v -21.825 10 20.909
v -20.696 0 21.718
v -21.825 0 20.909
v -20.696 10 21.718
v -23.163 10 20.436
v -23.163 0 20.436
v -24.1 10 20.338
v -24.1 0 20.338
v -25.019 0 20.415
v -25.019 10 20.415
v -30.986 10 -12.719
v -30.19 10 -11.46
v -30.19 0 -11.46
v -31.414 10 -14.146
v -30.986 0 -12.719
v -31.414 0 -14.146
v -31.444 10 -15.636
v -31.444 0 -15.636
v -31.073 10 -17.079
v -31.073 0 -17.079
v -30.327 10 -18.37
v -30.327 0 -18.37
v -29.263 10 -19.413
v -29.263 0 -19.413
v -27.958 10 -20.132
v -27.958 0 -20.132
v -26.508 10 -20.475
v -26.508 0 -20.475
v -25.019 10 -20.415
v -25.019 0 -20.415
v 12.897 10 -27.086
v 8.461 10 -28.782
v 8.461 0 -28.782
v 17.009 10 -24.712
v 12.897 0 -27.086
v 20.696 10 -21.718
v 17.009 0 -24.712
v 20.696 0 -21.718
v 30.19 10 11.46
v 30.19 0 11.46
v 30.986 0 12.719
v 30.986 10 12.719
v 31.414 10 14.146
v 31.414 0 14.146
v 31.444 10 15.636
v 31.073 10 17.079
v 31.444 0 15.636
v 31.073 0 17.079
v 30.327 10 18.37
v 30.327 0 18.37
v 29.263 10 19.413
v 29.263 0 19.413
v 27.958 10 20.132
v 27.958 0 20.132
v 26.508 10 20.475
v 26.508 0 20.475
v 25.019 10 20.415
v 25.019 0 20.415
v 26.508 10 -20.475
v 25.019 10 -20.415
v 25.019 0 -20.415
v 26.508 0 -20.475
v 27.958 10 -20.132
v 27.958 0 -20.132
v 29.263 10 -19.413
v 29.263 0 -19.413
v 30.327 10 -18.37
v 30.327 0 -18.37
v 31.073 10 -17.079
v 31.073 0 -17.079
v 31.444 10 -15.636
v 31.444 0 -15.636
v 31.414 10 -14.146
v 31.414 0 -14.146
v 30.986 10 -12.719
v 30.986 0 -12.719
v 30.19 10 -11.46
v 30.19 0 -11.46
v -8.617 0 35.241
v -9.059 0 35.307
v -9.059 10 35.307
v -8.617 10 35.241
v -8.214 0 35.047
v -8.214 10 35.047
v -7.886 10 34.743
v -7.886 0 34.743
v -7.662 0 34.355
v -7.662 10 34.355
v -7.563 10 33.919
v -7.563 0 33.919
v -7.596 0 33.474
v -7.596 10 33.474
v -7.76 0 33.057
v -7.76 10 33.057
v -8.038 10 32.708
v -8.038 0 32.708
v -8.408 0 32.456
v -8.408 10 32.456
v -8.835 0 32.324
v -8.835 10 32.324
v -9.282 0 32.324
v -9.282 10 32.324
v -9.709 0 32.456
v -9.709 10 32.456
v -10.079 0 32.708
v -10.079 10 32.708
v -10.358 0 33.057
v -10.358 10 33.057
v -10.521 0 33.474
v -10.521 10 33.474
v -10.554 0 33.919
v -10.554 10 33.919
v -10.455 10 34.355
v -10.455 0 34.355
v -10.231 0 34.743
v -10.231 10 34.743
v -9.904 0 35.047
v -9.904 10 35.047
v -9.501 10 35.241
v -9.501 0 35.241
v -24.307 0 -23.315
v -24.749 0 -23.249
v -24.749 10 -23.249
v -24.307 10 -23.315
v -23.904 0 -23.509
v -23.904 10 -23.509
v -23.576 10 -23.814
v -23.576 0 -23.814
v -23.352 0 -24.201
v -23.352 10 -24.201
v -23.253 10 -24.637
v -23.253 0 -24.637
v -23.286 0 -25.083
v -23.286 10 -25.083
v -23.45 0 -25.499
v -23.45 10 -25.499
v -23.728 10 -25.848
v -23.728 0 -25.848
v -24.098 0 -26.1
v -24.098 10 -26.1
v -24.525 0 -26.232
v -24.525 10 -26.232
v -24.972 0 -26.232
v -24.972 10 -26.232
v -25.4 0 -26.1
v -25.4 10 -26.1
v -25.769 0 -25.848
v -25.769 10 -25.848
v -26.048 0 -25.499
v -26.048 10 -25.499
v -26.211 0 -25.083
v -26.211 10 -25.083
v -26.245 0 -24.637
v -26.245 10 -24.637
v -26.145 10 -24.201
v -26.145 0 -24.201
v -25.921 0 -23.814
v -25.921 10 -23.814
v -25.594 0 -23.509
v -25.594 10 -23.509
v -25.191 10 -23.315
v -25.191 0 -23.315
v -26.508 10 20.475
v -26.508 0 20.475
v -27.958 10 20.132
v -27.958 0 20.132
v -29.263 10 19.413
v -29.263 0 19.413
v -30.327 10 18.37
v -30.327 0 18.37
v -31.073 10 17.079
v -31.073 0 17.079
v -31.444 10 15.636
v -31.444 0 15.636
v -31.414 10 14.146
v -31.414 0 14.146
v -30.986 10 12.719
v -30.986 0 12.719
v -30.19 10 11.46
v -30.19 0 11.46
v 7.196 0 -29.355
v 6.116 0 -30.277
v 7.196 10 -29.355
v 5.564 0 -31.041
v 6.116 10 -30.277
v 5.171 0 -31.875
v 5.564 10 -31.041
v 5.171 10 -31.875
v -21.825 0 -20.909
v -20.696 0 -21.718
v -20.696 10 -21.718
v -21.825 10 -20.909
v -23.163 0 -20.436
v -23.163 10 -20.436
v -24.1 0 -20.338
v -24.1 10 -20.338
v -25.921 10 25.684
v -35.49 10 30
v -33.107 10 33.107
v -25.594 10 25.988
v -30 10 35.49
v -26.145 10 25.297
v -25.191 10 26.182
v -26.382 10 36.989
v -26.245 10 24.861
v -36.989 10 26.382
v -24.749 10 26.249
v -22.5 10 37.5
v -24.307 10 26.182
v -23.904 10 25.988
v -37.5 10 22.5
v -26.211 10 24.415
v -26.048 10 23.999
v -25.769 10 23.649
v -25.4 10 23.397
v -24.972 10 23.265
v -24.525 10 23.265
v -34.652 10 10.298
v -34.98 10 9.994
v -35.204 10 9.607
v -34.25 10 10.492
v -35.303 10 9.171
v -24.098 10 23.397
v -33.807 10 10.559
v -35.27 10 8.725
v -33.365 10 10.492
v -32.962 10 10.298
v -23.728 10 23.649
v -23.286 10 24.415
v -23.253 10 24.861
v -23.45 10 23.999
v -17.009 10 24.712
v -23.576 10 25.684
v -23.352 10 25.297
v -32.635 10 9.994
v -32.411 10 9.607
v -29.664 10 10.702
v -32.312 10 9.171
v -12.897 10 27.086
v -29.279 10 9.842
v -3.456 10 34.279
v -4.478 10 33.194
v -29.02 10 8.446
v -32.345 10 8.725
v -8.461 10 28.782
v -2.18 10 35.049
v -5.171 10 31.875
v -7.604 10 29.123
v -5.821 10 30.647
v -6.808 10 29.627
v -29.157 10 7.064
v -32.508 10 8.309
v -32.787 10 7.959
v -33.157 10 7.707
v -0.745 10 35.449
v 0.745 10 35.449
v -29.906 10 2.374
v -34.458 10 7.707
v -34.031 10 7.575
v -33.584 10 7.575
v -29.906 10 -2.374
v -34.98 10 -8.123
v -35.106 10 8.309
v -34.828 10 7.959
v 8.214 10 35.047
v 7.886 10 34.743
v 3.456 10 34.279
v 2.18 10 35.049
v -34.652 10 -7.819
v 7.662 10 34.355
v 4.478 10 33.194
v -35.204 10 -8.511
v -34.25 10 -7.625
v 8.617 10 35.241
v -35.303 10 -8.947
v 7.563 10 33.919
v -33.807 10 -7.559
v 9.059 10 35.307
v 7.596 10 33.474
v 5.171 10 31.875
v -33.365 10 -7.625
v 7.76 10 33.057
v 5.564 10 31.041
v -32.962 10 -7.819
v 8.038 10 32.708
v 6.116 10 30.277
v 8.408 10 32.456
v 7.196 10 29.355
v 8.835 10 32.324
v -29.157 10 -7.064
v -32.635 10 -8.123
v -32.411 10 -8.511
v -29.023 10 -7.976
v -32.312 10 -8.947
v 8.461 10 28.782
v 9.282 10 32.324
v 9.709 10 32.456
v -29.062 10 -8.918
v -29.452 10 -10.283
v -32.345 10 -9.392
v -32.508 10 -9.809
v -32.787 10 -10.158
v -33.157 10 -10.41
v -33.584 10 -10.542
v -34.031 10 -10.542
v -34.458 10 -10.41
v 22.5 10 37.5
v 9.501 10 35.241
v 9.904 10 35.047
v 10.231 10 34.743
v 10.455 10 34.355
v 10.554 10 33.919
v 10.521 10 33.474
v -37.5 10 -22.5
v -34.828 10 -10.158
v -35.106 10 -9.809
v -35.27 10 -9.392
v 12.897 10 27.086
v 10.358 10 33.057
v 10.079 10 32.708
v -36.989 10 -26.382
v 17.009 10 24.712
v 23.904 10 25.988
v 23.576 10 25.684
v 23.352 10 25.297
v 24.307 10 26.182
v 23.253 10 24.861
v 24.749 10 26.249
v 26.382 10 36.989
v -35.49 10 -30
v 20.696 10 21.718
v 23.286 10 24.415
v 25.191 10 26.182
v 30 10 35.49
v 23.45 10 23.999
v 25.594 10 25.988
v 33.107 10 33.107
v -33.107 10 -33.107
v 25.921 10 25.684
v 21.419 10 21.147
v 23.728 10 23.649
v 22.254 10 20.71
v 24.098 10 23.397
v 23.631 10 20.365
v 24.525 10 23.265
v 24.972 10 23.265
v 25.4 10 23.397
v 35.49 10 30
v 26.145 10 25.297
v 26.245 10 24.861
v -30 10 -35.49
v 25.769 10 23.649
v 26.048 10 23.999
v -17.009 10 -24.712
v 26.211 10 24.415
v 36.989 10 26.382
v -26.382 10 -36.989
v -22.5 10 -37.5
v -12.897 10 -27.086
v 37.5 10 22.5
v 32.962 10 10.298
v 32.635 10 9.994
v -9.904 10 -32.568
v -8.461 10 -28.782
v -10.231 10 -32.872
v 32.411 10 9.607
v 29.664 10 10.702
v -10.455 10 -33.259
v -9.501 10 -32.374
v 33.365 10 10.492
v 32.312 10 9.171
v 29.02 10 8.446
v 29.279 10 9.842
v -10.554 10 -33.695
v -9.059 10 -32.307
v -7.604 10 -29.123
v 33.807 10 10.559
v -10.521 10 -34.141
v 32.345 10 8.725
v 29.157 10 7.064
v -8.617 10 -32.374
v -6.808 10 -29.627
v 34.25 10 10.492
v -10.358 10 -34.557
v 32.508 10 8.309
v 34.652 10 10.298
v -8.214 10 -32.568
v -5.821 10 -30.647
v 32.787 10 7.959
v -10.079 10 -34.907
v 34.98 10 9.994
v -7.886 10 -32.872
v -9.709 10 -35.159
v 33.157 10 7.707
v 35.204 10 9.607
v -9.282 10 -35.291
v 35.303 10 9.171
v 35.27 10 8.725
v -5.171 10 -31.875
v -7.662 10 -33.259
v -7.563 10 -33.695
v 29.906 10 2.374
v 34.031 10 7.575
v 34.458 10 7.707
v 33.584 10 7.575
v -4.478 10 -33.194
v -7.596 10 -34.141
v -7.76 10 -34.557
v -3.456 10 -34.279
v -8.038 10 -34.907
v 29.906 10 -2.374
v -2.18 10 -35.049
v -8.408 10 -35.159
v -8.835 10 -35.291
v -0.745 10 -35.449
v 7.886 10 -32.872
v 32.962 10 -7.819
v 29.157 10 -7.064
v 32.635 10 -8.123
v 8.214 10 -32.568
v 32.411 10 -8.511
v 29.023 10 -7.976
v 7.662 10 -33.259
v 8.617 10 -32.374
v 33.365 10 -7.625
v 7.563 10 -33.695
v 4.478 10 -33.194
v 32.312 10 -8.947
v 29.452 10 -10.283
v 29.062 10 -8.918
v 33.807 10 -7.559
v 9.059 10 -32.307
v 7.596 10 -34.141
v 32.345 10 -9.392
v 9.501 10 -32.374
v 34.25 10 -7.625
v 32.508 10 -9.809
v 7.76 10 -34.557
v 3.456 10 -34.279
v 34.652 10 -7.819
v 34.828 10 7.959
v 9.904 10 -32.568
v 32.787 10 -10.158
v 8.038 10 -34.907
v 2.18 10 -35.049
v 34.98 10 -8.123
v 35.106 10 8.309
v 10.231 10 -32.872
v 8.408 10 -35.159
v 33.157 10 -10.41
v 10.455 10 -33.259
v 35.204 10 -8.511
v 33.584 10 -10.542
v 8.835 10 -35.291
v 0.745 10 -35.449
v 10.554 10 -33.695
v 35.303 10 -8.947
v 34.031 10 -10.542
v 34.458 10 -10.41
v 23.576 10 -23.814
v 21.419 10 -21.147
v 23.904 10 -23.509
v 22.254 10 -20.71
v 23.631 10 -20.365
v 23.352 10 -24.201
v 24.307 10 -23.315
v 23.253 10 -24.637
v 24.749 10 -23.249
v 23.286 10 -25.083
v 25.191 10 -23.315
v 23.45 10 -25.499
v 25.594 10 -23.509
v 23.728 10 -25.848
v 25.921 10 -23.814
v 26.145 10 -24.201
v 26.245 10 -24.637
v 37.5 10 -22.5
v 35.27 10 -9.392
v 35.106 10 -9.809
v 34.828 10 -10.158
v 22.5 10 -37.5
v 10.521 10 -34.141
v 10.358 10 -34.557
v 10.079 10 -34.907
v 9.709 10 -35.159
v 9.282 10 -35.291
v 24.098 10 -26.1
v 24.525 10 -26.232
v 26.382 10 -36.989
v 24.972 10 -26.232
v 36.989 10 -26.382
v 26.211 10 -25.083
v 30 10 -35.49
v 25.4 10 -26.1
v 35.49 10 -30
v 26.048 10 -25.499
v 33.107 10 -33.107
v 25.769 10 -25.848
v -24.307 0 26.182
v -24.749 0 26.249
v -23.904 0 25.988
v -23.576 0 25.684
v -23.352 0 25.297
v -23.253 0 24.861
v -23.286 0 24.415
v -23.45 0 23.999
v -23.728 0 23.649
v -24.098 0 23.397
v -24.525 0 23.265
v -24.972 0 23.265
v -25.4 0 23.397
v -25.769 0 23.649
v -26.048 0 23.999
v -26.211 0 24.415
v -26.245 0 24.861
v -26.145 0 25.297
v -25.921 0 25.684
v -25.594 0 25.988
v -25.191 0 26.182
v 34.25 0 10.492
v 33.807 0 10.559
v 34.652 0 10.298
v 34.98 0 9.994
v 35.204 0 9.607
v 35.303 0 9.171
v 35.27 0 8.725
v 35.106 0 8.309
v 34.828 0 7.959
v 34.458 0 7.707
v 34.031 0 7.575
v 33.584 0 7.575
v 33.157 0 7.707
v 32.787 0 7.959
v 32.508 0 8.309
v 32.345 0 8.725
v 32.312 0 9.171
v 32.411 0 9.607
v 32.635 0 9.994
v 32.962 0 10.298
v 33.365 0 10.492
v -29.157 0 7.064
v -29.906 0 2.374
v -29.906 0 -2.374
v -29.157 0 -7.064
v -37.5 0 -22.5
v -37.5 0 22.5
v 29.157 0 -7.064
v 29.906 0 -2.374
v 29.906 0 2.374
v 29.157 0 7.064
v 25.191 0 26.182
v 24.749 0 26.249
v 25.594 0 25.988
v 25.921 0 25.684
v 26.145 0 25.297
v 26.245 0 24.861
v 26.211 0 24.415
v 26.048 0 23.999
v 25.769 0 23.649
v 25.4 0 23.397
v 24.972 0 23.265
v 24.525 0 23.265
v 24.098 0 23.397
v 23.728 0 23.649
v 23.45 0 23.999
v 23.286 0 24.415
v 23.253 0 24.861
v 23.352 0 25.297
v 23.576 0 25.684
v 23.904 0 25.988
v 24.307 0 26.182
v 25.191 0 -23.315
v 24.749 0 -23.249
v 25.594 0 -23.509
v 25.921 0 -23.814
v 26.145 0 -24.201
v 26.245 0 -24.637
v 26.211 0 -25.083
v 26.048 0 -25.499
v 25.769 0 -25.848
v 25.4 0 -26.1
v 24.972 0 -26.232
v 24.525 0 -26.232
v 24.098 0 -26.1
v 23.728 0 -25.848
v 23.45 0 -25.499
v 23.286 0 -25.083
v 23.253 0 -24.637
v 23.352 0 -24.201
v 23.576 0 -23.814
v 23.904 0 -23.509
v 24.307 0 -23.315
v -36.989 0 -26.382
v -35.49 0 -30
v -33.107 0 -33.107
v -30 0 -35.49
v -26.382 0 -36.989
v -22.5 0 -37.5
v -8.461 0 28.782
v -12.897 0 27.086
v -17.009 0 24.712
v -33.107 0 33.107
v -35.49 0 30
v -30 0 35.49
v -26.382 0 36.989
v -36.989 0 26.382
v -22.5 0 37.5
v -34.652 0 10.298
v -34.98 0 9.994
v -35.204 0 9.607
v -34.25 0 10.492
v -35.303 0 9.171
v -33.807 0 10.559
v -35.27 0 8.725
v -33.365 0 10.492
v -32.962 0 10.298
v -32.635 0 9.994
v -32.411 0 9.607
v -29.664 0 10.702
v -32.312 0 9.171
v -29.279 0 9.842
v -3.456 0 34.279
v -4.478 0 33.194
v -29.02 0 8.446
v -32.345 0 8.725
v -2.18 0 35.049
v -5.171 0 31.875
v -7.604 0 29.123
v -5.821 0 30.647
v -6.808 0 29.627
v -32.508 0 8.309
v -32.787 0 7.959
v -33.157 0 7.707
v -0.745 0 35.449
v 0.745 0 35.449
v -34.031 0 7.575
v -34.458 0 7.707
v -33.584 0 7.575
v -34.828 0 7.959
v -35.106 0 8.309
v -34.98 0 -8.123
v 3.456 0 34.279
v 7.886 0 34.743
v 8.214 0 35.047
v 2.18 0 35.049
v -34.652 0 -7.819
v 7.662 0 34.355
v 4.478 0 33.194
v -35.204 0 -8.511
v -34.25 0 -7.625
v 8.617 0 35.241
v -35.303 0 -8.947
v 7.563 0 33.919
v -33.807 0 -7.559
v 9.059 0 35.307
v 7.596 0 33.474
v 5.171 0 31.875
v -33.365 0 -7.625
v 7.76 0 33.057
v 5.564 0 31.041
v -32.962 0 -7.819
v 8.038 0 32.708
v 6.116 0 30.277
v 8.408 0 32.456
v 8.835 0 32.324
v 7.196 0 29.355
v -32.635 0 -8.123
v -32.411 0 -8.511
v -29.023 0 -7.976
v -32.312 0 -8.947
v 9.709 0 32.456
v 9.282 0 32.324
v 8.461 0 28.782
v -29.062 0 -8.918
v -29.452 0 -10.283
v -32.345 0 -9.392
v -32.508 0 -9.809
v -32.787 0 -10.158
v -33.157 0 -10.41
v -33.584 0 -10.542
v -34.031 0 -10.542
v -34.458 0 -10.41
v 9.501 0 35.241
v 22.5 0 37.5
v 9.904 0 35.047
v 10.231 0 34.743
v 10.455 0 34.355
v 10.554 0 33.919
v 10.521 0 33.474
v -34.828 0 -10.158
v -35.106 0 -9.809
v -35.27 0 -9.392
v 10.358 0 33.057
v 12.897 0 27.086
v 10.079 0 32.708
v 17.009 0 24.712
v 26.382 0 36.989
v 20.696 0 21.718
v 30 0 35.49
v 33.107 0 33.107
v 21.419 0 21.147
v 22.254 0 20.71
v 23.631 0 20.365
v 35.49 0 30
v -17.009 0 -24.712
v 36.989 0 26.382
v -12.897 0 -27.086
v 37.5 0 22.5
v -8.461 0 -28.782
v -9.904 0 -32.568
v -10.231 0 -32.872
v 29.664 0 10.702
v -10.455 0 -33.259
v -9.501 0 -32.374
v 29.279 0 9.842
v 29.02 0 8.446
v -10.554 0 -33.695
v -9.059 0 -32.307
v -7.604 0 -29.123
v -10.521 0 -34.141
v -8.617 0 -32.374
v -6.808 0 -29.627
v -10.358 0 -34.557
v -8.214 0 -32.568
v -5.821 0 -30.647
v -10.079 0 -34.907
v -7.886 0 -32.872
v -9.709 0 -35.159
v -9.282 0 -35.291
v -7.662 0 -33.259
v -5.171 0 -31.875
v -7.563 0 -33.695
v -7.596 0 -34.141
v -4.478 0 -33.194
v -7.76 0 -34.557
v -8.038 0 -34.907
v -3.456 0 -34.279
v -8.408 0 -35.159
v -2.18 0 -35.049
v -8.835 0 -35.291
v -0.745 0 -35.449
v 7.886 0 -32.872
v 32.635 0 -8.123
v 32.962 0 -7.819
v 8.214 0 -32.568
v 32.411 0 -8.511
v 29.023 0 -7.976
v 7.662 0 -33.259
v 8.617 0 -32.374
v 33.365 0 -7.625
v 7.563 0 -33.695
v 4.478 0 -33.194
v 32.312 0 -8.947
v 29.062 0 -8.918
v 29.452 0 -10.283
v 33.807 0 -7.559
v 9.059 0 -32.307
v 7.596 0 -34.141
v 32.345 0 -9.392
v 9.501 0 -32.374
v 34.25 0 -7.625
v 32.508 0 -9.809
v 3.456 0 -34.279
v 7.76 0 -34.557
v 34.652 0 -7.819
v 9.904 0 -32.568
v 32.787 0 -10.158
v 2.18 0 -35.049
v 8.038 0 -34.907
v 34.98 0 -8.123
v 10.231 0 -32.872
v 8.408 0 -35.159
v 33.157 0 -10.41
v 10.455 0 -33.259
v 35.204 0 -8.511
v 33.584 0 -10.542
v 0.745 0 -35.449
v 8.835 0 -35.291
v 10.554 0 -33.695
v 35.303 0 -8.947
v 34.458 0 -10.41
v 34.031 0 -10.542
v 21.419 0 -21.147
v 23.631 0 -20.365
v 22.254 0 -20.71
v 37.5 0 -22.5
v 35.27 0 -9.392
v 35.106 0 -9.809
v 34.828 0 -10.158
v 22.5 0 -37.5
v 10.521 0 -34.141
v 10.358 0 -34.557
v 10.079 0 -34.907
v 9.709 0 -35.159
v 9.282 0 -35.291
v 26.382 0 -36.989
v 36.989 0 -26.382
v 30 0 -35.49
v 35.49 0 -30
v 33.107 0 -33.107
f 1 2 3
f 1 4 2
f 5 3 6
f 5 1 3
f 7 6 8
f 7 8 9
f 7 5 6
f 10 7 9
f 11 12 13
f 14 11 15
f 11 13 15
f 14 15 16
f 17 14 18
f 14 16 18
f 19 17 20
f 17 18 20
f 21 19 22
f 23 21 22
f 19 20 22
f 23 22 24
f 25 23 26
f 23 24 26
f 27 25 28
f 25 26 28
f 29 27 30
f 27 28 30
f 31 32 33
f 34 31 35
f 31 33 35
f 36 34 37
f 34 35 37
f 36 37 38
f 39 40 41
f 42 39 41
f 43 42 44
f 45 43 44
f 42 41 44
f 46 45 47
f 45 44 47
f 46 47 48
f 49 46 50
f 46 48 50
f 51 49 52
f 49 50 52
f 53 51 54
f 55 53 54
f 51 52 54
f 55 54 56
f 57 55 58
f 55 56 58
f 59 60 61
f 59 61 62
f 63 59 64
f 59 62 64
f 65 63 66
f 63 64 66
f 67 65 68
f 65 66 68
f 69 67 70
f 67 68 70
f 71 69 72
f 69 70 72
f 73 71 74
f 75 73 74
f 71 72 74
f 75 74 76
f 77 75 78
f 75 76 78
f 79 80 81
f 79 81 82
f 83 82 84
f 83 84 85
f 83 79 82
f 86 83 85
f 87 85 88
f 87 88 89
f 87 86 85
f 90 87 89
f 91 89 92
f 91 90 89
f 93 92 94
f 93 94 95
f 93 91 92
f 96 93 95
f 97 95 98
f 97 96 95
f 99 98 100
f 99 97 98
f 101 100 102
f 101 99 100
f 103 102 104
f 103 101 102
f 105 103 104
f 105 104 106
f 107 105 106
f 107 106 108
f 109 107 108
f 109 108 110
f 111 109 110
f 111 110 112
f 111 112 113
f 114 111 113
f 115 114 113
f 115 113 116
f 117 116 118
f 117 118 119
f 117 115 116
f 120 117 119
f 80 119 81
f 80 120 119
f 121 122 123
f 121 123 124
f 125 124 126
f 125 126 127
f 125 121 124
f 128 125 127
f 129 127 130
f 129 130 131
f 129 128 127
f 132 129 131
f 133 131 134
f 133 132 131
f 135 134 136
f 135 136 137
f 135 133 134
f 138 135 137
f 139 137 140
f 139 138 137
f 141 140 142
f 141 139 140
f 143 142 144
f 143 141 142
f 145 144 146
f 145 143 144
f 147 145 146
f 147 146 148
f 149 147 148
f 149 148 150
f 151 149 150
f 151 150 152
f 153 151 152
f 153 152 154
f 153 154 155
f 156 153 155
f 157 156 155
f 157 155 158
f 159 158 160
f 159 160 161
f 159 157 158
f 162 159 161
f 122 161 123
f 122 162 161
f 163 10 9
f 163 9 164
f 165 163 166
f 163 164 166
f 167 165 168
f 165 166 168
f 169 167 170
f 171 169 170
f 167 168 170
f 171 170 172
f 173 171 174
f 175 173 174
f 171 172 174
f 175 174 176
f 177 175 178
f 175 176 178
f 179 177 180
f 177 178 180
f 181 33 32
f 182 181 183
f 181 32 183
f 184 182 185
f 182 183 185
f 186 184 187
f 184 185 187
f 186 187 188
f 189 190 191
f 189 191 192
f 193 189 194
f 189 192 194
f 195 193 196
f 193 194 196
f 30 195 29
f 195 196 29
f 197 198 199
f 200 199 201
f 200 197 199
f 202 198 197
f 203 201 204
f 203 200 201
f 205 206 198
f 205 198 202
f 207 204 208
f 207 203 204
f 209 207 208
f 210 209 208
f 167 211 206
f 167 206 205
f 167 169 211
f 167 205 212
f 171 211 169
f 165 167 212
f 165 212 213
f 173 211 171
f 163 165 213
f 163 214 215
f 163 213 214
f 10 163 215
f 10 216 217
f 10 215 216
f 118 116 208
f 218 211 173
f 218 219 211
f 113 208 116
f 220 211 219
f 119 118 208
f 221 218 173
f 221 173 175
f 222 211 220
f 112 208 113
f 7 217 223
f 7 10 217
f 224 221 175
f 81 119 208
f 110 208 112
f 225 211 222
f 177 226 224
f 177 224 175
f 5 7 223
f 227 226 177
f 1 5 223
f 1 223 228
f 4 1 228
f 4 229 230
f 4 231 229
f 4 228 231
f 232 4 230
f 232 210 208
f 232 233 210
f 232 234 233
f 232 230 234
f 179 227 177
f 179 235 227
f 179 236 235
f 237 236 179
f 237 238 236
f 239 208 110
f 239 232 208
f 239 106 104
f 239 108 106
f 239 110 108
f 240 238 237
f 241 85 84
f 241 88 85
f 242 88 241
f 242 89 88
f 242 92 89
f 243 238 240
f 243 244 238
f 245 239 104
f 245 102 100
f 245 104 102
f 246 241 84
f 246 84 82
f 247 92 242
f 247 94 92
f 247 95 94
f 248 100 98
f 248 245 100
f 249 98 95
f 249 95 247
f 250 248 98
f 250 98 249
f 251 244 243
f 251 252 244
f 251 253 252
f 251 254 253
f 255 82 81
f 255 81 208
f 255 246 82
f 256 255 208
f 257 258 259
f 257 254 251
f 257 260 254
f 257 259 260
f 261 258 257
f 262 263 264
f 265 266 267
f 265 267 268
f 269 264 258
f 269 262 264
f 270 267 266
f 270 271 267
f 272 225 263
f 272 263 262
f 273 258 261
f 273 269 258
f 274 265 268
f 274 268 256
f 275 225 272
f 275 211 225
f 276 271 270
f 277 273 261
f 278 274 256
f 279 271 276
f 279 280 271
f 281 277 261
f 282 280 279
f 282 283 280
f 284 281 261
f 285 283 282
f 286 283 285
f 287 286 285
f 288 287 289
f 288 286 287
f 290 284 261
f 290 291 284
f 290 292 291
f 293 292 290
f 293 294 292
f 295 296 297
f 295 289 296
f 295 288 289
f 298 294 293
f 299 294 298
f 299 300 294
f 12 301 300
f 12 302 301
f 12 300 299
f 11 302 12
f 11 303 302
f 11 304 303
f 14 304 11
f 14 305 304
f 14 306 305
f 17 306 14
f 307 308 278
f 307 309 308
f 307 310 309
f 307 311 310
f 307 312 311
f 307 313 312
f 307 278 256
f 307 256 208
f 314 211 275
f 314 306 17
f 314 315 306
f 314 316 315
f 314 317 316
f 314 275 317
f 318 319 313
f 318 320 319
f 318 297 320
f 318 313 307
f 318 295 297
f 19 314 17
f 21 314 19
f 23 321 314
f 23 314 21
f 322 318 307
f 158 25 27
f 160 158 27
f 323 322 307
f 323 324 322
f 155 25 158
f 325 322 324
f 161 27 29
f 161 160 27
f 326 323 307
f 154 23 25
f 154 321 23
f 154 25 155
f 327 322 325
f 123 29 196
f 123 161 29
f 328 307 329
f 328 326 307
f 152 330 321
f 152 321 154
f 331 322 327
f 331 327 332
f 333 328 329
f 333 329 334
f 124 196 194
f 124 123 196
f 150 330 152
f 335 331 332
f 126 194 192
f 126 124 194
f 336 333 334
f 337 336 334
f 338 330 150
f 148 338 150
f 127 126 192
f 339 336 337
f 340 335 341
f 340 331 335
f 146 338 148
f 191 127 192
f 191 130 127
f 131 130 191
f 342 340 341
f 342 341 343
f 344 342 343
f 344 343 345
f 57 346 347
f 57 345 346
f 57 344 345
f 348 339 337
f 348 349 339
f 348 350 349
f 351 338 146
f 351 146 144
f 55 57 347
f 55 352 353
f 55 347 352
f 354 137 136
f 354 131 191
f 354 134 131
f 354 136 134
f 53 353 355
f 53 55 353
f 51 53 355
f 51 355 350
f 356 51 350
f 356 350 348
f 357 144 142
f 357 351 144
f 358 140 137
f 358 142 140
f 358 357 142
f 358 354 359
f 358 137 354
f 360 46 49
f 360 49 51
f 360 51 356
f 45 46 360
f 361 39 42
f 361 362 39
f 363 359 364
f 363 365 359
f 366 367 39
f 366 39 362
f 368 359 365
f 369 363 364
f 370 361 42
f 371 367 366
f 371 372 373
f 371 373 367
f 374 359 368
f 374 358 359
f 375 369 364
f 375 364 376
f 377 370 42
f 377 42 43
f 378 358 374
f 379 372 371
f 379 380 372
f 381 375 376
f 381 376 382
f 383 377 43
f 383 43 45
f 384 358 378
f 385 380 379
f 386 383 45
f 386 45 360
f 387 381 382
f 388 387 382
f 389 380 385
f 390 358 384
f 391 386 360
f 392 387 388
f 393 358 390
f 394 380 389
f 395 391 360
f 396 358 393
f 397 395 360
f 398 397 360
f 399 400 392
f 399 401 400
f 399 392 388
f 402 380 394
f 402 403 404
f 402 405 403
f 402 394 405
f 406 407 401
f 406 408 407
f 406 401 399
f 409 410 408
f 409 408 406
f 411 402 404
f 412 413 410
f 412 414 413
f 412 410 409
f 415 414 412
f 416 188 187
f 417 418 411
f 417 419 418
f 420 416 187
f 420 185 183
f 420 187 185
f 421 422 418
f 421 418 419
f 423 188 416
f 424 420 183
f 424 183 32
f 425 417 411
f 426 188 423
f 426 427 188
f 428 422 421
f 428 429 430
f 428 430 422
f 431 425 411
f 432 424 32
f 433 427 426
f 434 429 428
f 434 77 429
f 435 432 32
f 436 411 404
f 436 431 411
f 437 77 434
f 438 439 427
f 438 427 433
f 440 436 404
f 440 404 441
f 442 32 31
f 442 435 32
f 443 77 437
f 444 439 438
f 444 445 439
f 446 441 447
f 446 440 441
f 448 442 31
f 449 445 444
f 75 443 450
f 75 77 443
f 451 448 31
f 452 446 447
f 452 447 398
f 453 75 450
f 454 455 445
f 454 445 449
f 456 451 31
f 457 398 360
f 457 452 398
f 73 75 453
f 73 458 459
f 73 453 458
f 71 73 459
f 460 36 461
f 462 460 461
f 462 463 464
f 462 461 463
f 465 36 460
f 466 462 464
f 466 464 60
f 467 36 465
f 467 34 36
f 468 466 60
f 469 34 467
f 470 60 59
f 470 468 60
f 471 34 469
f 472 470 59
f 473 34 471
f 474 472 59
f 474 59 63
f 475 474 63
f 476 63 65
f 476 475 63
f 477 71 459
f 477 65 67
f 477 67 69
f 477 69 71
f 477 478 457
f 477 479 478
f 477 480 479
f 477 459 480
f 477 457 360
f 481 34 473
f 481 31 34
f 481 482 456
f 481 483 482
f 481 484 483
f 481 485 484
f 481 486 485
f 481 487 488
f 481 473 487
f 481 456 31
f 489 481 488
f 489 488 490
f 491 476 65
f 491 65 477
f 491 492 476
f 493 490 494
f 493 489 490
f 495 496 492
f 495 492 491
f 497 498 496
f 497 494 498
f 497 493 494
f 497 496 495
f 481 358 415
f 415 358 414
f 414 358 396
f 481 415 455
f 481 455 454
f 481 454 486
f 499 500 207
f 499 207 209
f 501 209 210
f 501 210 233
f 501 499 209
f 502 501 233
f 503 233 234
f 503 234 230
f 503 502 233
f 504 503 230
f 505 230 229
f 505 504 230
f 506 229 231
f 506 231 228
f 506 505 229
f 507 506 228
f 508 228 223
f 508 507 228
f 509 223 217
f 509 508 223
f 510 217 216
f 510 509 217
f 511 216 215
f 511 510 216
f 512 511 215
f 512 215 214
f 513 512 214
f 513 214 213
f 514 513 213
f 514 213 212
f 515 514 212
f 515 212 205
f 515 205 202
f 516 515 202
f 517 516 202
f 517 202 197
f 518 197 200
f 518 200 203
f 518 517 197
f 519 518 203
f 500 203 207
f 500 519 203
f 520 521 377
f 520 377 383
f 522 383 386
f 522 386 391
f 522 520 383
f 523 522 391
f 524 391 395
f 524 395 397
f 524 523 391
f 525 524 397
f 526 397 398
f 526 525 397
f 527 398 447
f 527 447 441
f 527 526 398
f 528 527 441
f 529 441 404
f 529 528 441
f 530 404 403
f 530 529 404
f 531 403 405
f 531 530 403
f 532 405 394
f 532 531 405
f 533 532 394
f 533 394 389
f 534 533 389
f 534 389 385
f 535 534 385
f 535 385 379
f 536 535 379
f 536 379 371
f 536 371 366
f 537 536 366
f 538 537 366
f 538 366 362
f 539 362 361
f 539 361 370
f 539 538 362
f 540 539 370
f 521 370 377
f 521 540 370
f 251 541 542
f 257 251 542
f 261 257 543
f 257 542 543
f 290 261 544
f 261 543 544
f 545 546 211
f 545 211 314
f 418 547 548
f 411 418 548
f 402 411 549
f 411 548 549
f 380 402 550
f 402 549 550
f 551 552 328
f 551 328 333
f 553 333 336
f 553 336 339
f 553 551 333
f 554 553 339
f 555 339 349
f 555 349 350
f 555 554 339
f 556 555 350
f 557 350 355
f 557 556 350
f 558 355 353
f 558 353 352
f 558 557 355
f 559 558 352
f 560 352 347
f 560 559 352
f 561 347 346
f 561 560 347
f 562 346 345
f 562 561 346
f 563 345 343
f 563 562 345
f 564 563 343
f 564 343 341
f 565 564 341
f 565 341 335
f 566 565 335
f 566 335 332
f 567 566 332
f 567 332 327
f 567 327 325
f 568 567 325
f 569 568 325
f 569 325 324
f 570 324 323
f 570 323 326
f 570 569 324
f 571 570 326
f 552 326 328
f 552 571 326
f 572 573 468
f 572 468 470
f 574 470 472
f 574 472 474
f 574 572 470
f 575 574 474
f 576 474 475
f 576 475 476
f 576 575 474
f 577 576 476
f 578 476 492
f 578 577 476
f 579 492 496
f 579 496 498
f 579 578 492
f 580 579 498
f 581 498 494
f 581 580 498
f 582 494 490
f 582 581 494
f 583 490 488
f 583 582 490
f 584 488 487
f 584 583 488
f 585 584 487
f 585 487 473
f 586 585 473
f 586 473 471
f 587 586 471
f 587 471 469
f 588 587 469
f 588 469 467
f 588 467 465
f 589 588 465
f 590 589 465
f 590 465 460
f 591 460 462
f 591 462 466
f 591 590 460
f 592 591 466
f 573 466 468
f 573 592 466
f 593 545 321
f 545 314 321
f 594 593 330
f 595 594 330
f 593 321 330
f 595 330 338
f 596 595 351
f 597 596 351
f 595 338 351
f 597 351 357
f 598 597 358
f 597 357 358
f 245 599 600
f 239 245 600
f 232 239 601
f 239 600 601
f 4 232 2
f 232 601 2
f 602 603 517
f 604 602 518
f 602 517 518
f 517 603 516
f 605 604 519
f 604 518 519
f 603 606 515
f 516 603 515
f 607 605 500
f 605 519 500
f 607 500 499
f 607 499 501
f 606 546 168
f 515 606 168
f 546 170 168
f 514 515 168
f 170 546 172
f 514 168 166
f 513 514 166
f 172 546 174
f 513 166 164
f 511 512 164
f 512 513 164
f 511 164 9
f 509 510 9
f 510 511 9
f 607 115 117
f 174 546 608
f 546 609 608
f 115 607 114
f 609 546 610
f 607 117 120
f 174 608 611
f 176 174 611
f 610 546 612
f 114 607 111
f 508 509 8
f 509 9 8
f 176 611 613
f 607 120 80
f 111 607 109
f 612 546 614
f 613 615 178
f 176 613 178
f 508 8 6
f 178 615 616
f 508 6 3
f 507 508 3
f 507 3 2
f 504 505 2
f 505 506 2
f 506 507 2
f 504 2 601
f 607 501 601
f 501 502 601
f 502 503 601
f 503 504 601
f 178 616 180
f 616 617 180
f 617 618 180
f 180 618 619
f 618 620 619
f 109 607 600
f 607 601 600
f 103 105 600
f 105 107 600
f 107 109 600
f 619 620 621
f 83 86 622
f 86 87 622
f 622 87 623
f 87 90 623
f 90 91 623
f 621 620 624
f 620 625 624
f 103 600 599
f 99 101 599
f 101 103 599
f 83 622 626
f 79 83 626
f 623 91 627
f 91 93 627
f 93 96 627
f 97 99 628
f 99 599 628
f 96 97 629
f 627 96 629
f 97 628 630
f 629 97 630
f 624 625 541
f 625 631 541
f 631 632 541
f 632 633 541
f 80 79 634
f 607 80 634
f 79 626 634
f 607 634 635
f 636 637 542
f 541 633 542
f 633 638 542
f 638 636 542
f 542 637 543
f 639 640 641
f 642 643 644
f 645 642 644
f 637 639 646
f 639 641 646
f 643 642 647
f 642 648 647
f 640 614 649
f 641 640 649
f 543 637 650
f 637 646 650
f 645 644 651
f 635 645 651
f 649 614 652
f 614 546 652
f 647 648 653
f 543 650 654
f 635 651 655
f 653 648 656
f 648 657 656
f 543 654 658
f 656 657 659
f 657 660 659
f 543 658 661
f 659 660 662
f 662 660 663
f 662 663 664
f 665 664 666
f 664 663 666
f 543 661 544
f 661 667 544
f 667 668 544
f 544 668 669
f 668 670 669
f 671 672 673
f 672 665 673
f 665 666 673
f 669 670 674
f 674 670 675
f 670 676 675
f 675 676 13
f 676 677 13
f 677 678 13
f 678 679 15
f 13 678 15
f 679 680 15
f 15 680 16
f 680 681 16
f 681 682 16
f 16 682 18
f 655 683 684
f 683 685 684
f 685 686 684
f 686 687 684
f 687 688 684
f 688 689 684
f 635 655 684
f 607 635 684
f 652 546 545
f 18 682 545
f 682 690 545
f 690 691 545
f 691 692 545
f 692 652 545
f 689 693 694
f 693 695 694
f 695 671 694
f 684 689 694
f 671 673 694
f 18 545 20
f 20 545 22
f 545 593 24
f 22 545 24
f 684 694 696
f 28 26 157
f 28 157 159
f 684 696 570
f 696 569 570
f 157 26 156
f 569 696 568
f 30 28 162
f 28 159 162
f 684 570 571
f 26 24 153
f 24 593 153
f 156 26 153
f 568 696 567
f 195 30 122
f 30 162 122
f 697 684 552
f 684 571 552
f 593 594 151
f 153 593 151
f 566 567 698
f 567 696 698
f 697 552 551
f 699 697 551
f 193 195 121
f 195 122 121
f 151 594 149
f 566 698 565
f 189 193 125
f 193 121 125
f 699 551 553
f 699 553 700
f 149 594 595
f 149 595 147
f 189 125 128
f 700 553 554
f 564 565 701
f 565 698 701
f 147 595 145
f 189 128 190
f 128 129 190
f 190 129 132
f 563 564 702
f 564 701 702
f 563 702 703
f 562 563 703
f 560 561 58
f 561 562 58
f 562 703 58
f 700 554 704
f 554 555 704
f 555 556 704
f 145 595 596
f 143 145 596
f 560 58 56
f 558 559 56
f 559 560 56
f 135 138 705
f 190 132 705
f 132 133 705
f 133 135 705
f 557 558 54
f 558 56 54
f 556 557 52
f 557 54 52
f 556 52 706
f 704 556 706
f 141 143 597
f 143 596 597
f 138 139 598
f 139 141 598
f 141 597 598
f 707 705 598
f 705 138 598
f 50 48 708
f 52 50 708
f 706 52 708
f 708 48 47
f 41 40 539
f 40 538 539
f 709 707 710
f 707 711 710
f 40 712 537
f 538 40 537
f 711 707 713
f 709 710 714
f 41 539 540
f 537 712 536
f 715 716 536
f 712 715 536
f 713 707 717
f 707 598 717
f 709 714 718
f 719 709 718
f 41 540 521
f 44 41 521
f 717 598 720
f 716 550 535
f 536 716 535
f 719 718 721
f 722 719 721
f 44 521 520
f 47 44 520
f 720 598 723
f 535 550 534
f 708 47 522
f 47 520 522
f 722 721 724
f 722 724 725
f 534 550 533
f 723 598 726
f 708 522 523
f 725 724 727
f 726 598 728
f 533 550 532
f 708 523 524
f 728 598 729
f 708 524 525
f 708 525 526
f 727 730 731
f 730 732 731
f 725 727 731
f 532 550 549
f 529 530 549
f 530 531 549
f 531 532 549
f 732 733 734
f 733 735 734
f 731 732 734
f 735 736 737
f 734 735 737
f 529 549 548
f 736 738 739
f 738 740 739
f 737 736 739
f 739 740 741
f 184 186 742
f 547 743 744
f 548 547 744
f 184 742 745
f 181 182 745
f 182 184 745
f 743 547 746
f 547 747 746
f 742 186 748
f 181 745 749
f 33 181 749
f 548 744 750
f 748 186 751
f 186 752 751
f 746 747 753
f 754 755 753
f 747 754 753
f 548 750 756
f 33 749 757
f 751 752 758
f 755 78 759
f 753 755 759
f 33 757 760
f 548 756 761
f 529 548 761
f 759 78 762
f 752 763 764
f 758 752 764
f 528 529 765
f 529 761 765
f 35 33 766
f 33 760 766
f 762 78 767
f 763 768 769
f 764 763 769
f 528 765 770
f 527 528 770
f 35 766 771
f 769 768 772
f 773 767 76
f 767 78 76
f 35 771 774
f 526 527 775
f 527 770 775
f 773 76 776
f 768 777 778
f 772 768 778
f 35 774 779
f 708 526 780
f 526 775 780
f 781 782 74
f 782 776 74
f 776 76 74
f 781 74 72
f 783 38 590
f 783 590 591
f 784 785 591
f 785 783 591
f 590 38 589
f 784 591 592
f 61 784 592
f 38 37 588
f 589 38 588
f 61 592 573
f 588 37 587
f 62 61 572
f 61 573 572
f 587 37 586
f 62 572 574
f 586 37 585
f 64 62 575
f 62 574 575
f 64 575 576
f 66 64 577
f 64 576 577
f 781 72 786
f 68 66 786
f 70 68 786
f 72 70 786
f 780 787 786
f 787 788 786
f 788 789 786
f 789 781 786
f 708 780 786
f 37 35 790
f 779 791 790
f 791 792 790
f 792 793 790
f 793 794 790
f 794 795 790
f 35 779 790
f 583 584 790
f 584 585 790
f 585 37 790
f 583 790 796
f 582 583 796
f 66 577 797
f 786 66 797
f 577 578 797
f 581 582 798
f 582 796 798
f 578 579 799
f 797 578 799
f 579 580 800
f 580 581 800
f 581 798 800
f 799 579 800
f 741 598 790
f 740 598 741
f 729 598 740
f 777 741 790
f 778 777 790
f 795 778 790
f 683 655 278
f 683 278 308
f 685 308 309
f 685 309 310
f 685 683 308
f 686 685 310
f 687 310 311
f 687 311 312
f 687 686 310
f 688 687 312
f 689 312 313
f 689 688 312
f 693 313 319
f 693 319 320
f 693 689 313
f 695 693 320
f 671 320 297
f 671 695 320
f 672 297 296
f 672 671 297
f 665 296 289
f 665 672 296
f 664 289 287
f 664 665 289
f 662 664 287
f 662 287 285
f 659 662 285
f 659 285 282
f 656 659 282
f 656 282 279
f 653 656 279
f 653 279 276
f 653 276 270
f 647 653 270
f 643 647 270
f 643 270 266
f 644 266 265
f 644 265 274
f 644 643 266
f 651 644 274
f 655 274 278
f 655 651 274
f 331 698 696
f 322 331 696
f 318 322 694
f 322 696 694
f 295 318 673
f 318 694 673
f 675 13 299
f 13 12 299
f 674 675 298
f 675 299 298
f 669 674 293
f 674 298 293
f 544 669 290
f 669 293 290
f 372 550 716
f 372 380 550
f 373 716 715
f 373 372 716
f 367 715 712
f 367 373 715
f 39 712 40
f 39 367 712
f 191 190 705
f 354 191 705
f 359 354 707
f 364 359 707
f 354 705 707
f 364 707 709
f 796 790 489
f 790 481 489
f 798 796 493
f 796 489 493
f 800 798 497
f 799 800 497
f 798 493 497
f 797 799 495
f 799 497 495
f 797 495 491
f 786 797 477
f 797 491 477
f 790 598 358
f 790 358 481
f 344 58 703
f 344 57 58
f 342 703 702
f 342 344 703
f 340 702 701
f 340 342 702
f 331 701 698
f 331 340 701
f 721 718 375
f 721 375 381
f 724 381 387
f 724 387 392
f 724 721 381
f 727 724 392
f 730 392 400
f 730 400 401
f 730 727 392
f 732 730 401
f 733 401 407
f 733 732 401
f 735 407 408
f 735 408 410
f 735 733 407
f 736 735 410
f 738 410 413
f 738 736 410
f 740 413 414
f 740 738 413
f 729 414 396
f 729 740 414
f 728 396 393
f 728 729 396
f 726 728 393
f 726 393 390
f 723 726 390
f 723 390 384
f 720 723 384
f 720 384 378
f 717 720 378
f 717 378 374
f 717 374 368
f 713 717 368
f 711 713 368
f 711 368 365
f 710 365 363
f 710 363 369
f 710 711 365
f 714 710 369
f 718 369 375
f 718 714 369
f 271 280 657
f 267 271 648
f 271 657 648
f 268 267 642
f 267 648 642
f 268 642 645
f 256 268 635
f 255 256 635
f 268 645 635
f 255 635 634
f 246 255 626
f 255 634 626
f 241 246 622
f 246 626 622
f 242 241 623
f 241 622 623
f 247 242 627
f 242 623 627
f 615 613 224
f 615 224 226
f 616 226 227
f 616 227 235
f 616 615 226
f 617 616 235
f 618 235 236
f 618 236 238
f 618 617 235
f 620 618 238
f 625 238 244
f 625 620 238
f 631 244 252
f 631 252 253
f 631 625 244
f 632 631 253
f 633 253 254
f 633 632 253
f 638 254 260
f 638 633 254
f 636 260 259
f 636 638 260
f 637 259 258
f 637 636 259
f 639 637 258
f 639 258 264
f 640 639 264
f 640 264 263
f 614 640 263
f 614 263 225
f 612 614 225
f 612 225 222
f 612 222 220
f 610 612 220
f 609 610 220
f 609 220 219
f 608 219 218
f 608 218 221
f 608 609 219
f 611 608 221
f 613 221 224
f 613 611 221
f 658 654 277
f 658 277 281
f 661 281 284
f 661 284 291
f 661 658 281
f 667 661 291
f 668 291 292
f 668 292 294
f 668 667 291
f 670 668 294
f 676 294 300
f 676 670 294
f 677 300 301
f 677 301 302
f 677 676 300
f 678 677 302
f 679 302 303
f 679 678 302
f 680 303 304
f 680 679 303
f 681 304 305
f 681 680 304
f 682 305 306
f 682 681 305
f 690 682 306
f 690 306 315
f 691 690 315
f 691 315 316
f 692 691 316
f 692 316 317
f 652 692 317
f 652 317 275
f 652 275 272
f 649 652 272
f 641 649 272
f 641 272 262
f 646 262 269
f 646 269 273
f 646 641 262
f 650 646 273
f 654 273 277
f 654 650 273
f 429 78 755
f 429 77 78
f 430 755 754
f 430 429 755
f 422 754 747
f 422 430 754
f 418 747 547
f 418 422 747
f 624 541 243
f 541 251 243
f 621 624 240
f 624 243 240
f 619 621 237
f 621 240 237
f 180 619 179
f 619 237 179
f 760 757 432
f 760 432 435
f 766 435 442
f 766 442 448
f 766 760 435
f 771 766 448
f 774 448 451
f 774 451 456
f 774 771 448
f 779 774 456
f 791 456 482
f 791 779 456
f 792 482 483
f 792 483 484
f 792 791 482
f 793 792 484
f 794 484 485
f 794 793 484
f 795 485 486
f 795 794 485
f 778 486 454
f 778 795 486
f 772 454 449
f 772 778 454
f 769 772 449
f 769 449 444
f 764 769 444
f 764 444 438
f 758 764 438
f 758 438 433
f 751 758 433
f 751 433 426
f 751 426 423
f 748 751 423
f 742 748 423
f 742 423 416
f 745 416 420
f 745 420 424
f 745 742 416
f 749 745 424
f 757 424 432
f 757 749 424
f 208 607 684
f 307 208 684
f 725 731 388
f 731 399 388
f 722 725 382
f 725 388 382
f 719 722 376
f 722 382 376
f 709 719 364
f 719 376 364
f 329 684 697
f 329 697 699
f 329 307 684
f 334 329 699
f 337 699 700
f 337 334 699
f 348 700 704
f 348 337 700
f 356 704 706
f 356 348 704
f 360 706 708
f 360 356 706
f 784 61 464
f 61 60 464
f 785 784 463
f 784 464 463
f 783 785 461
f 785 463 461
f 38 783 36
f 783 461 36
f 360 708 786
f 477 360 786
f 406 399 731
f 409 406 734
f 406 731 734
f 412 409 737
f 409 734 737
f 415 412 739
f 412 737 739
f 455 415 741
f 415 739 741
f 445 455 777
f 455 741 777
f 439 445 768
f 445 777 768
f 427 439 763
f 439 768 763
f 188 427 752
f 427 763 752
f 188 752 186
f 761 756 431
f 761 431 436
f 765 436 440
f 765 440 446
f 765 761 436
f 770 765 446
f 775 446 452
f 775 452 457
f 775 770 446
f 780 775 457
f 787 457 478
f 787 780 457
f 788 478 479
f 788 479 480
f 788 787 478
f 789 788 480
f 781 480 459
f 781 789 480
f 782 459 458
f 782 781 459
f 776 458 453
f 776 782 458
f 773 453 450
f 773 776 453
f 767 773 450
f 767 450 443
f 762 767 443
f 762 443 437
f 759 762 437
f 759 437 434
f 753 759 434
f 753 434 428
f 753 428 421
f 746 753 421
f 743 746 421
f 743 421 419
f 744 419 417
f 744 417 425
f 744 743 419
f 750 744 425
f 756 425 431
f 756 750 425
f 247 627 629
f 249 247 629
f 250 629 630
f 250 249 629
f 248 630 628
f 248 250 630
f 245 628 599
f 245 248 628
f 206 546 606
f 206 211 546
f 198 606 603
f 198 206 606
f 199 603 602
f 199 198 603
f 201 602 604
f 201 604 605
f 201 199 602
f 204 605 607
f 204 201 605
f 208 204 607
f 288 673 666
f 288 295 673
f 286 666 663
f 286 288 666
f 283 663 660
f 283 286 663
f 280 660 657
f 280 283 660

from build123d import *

# Parameters (mm, degrees)
SKETCH1_W           = 75
SKETCH1_H           = 75
SKETCH1_R           = 1.5
BOSS_EXTRUDE1_DEPTH = 10
FILLET1_R           = 5
FILLET2_R           = 15


with BuildPart() as part:
    # Sketch1 → Boss-Extrude1 (new body)
    with BuildSketch(Plane(origin=(0, 0, 0), x_dir=(1, 0, 0), z_dir=(0, 1, 0))):
        Rectangle(SKETCH1_W, SKETCH1_H)
        with Locations(Location((24.748737342, 24.748737342, 0), (0, 0, 270))):
            Circle(SKETCH1_R, mode=Mode.SUBTRACT)
        with Locations(Location((-24.748737342, -24.748737342, 0), (0, 0, 270))):
            Circle(SKETCH1_R, mode=Mode.SUBTRACT)
        with Locations(Location((-9.058666579, -33.80740392, 0), (0, 0, 270))):
            Circle(SKETCH1_R, mode=Mode.SUBTRACT)
        with Locations(Location((-33.80740392, -9.058666579, 0), (0, 0, 270))):
            Circle(SKETCH1_R, mode=Mode.SUBTRACT)
        with Locations(Location((9.058666579, -33.80740392, 0), (0, 0, 270))):
            Circle(SKETCH1_R, mode=Mode.SUBTRACT)
        with Locations(Location((24.748737342, -24.748737342, 0), (0, 0, 270))):
            Circle(SKETCH1_R, mode=Mode.SUBTRACT)
        with Locations(Location((33.80740392, -9.058666579, 0), (0, 0, 270))):
            Circle(SKETCH1_R, mode=Mode.SUBTRACT)
        with Locations(Location((-33.80740392, 9.058666579, 0), (0, 0, 270))):
            Circle(SKETCH1_R, mode=Mode.SUBTRACT)
        with Locations(Location((-24.748737342, 24.748737342, 0), (0, 0, 270))):
            Circle(SKETCH1_R, mode=Mode.SUBTRACT)
        with Locations(Location((-9.058666579, 33.80740392, 0), (0, 0, 270))):
            Circle(SKETCH1_R, mode=Mode.SUBTRACT)
        with BuildLine():
            ThreePointArc((28.282562779, 10.004830964), (30, 0), (28.282562779, -10.004830964))
            ThreePointArc((28.282562779, -10.004830964), (30.743901834, -17.75), (22.805719165, -19.491002369))
            ThreePointArc((22.805719165, -19.491002369), (15, -25.980762114), (5.476843614, -29.495833333))
            ThreePointArc((5.476843614, -29.495833333), (0, -35.5), (-5.476843614, -29.495833333))
            ThreePointArc((-5.476843614, -29.495833333), (-15, -25.980762114), (-22.805719165, -19.491002369))
            ThreePointArc((-22.805719165, -19.491002369), (-30.743901834, -17.75), (-28.282562779, -10.004830964))
            ThreePointArc((-28.282562779, -10.004830964), (-30, 0), (-28.282562779, 10.004830964))
            ThreePointArc((-28.282562779, 10.004830964), (-30.743901834, 17.75), (-22.805719165, 19.491002369))
            ThreePointArc((-22.805719165, 19.491002369), (-15, 25.980762114), (-5.476843614, 29.495833333))
            ThreePointArc((-5.476843614, 29.495833333), (0, 35.5), (5.476843614, 29.495833333))
            ThreePointArc((5.476843614, 29.495833333), (15, 25.980762114), (22.805719165, 19.491002369))
            ThreePointArc((22.805719165, 19.491002369), (30.743901834, 17.75), (28.282562779, 10.004830964))
        make_face(mode=Mode.SUBTRACT)
        with Locations(Location((33.80740392, 9.058666579, 0), (0, 0, 270))):
            Circle(SKETCH1_R, mode=Mode.SUBTRACT)
        with Locations(Location((9.058666579, 33.80740392, 0), (0, 0, 270))):
            Circle(SKETCH1_R, mode=Mode.SUBTRACT)
    extrude(amount=BOSS_EXTRUDE1_DEPTH)

    # Fillet1
    fillet1_edges = [part.edges().sort_by_distance(p)[0] for p in [
        (-28.282562779, 5, -10.004830964),
        (-28.282562779, 5, 10.004830964),
        (-22.805719165, 5, 19.491002369),
        (-5.476843614, 5, 29.495833333),
        (5.476843614, 5, 29.495833333),
        (22.805719165, 5, 19.491002369),
        (28.282562779, 5, 10.004830964),
        (28.282562779, 5, -10.004830964),
        (22.805719165, 5, -19.491002369),
        (5.476843614, 5, -29.495833333),
        (-5.476843614, 5, -29.495833333),
        (-22.805719165, 5, -19.491002369),
    ]]
    fillet(fillet1_edges, radius=FILLET1_R)

    # Fillet2
    fillet2_edges = [part.edges().sort_by_distance(p)[0] for p in [
        (-37.5, 5, -37.5),
        (37.5, 5, -37.5),
        (37.5, 5, 37.5),
        (-37.5, 5, 37.5),
    ]]
    fillet(fillet2_edges, radius=FILLET2_R)


solid = part.part
